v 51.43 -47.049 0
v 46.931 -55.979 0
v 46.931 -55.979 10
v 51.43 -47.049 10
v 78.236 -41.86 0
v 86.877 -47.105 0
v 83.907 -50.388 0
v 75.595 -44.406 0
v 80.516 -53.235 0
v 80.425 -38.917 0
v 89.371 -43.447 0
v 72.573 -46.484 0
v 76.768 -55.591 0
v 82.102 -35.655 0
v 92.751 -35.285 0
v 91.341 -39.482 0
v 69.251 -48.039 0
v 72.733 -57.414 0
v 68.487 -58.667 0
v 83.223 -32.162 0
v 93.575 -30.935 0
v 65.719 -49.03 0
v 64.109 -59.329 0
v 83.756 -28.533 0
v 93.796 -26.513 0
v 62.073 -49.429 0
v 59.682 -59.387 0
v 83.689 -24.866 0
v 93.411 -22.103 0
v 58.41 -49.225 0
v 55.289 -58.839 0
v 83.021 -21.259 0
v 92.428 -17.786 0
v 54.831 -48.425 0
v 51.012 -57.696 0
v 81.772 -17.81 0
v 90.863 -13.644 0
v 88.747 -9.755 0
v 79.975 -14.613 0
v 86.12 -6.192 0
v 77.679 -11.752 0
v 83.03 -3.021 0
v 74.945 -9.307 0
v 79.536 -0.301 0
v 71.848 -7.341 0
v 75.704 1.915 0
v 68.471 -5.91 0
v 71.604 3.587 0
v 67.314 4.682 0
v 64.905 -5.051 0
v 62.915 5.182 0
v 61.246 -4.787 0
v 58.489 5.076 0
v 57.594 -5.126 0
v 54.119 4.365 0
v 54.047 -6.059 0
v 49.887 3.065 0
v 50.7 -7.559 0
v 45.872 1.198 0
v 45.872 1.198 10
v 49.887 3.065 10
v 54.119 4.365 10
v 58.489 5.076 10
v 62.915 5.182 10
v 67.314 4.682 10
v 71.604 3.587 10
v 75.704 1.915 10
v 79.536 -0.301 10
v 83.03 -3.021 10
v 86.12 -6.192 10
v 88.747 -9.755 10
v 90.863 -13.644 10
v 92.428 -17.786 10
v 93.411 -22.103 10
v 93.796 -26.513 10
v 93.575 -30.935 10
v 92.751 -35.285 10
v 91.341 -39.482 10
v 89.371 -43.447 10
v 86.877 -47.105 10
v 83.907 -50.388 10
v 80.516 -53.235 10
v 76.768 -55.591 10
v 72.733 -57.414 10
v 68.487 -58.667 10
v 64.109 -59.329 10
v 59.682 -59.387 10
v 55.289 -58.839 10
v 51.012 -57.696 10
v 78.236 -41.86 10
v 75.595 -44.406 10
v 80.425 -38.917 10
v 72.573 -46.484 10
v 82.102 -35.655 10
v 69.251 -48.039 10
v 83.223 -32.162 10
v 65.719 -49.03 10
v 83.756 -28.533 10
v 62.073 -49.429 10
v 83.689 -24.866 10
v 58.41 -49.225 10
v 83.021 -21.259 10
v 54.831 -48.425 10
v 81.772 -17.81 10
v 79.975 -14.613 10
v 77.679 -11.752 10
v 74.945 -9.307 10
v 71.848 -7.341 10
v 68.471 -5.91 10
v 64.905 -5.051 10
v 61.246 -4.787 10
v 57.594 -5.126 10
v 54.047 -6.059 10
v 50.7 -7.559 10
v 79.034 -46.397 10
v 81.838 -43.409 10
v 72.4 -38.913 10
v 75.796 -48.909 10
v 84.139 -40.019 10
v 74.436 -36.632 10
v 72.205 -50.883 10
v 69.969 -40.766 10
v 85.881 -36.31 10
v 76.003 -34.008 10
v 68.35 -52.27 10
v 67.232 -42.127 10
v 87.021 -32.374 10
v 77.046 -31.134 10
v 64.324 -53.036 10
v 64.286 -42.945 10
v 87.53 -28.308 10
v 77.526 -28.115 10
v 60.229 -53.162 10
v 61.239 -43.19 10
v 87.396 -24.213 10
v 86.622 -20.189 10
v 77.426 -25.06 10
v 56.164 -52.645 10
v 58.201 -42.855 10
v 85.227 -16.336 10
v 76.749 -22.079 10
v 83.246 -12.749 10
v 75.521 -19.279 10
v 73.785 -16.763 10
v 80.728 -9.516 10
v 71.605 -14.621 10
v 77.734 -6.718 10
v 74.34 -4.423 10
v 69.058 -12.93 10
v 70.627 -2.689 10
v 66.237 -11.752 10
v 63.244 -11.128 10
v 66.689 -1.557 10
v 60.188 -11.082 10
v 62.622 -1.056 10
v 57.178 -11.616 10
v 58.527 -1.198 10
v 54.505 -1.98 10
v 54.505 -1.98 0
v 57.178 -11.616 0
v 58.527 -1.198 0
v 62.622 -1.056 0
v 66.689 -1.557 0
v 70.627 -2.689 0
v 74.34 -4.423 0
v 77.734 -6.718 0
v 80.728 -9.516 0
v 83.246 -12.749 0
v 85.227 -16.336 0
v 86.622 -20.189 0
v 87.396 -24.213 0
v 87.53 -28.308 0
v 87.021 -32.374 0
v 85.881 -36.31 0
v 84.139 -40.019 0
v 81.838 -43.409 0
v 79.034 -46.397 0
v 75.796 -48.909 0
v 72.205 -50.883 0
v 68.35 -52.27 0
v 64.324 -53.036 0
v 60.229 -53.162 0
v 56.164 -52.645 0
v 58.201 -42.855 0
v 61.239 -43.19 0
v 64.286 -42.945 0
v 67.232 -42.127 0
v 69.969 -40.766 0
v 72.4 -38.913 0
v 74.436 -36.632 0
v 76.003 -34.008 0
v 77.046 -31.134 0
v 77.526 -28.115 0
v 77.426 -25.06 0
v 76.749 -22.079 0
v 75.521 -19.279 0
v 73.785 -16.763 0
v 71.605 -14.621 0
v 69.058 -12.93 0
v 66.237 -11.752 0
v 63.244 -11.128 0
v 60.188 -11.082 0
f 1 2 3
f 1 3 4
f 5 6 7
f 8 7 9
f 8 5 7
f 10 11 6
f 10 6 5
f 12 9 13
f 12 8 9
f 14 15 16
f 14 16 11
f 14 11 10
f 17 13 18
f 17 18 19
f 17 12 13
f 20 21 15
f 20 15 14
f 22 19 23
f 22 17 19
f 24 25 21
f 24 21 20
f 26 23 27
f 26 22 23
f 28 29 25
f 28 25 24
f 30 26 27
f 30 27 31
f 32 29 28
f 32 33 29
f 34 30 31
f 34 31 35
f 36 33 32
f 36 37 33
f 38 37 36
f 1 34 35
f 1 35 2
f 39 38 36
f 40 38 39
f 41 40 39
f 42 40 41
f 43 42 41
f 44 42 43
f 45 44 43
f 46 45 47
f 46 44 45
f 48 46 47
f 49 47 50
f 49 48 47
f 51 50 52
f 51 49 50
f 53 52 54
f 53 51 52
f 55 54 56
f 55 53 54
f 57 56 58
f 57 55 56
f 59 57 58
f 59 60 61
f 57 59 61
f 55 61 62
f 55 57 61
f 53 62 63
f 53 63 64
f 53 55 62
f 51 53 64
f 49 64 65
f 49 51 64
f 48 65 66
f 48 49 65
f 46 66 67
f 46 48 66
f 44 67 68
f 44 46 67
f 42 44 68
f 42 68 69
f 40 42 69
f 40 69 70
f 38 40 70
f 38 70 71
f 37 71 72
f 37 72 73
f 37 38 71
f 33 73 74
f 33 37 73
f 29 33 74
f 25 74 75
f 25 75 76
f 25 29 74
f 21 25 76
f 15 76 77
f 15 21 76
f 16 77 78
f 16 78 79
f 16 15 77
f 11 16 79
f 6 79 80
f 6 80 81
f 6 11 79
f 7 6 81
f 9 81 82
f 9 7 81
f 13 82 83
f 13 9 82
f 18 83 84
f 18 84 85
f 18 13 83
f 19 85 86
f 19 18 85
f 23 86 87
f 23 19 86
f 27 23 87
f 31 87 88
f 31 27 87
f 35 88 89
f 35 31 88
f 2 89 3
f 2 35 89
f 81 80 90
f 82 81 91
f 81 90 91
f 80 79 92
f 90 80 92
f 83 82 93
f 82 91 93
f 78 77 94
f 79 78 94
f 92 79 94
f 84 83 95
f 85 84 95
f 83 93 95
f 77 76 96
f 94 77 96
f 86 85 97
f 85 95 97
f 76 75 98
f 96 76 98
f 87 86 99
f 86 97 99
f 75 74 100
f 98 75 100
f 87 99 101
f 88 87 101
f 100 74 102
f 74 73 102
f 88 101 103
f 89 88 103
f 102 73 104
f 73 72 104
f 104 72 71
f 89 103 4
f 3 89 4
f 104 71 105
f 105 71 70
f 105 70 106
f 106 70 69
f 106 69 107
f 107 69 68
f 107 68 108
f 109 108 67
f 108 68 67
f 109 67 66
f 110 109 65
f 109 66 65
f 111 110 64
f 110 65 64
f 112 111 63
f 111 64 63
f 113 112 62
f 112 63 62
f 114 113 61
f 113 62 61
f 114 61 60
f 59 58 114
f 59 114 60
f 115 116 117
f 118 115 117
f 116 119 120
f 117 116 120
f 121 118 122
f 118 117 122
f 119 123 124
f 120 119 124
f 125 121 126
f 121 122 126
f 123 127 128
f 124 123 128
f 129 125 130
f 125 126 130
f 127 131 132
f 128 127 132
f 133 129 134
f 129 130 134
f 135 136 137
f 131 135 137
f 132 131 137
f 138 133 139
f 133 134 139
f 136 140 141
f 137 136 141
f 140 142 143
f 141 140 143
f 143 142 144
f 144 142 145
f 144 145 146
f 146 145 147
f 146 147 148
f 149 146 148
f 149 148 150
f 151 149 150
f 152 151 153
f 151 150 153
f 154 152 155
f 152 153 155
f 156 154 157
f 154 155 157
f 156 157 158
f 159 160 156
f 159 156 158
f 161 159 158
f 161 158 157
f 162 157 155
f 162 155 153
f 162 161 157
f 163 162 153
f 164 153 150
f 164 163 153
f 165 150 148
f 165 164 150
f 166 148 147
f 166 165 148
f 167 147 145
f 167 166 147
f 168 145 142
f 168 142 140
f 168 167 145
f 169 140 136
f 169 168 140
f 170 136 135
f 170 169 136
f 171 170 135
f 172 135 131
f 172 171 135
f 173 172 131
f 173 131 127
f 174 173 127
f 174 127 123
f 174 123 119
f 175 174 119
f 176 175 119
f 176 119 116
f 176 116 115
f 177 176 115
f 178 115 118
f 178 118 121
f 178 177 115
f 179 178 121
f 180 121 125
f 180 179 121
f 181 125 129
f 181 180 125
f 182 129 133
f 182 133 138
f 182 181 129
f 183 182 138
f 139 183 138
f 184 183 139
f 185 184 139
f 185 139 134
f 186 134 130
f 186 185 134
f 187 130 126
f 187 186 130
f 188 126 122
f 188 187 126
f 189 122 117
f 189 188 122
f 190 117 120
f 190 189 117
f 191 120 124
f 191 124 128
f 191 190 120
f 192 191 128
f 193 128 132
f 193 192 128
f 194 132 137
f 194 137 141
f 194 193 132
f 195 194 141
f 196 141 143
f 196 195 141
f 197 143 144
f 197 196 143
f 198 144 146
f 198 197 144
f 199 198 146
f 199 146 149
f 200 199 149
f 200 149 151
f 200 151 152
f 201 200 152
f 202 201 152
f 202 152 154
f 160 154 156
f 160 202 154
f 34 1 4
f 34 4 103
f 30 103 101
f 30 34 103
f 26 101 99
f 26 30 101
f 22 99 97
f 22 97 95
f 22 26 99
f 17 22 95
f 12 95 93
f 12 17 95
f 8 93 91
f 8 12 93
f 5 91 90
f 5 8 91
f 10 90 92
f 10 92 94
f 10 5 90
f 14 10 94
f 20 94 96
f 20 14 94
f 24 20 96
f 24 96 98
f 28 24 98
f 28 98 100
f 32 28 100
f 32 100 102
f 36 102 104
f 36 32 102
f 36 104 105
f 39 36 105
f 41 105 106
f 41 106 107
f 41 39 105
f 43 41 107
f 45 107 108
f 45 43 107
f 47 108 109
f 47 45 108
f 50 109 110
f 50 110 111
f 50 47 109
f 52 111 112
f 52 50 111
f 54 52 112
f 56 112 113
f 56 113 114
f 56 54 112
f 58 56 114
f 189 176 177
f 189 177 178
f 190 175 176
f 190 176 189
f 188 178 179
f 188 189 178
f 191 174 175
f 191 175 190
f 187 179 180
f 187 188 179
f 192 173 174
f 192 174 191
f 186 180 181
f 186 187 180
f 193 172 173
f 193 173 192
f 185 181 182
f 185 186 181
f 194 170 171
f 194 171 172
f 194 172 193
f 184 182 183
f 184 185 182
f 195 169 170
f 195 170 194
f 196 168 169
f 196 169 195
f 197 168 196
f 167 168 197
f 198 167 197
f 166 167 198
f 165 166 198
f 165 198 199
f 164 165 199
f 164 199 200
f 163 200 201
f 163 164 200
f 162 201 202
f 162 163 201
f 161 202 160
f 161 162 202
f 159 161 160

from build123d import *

# Parameters (mm, degrees)
EXTRUDE_THIN2_DEPTH   = 10
EXTRUDE_THIN2_2_DEPTH = 10


with BuildPart() as part:
    # Sketch4 → Extrude-Thin2 (new body)
    with BuildSketch(Plane.XY):
        with BuildLine():
            ThreePointArc((51.430434586, -47.048700863), (83.798011386, -26.698324999), (50.699658978, -7.559440665))
            Line((50.699658978, -7.559440665), (45.872467494, 1.198311466))
            ThreePointArc((45.872467494, 1.198311466), (93.796299525, -26.513299879), (46.930573562, -55.979056442))
            Line((46.930573562, -55.979056442), (51.430434586, -47.048700863))
        make_face()
    extrude(amount=EXTRUDE_THIN2_DEPTH)


with BuildPart() as body_2:
    # Sketch4 → Extrude-Thin2 2 (new body)
    with BuildSketch(Plane.XY):
        with BuildLine():
            ThreePointArc((58.200812032, -42.854949454), (77.548623594, -26.585101854), (57.177856739, -11.615879733))
            Line((57.177856739, -11.615879733), (54.504680696, -1.979794955))
            ThreePointArc((54.504680696, -1.979794955), (87.543266392, -26.257817052), (56.163773668, -52.645275021))
            Line((56.163773668, -52.645275021), (58.200812032, -42.854949454))
        make_face()
    extrude(amount=EXTRUDE_THIN2_2_DEPTH)


solid = Compound([part.part, body_2.part])
